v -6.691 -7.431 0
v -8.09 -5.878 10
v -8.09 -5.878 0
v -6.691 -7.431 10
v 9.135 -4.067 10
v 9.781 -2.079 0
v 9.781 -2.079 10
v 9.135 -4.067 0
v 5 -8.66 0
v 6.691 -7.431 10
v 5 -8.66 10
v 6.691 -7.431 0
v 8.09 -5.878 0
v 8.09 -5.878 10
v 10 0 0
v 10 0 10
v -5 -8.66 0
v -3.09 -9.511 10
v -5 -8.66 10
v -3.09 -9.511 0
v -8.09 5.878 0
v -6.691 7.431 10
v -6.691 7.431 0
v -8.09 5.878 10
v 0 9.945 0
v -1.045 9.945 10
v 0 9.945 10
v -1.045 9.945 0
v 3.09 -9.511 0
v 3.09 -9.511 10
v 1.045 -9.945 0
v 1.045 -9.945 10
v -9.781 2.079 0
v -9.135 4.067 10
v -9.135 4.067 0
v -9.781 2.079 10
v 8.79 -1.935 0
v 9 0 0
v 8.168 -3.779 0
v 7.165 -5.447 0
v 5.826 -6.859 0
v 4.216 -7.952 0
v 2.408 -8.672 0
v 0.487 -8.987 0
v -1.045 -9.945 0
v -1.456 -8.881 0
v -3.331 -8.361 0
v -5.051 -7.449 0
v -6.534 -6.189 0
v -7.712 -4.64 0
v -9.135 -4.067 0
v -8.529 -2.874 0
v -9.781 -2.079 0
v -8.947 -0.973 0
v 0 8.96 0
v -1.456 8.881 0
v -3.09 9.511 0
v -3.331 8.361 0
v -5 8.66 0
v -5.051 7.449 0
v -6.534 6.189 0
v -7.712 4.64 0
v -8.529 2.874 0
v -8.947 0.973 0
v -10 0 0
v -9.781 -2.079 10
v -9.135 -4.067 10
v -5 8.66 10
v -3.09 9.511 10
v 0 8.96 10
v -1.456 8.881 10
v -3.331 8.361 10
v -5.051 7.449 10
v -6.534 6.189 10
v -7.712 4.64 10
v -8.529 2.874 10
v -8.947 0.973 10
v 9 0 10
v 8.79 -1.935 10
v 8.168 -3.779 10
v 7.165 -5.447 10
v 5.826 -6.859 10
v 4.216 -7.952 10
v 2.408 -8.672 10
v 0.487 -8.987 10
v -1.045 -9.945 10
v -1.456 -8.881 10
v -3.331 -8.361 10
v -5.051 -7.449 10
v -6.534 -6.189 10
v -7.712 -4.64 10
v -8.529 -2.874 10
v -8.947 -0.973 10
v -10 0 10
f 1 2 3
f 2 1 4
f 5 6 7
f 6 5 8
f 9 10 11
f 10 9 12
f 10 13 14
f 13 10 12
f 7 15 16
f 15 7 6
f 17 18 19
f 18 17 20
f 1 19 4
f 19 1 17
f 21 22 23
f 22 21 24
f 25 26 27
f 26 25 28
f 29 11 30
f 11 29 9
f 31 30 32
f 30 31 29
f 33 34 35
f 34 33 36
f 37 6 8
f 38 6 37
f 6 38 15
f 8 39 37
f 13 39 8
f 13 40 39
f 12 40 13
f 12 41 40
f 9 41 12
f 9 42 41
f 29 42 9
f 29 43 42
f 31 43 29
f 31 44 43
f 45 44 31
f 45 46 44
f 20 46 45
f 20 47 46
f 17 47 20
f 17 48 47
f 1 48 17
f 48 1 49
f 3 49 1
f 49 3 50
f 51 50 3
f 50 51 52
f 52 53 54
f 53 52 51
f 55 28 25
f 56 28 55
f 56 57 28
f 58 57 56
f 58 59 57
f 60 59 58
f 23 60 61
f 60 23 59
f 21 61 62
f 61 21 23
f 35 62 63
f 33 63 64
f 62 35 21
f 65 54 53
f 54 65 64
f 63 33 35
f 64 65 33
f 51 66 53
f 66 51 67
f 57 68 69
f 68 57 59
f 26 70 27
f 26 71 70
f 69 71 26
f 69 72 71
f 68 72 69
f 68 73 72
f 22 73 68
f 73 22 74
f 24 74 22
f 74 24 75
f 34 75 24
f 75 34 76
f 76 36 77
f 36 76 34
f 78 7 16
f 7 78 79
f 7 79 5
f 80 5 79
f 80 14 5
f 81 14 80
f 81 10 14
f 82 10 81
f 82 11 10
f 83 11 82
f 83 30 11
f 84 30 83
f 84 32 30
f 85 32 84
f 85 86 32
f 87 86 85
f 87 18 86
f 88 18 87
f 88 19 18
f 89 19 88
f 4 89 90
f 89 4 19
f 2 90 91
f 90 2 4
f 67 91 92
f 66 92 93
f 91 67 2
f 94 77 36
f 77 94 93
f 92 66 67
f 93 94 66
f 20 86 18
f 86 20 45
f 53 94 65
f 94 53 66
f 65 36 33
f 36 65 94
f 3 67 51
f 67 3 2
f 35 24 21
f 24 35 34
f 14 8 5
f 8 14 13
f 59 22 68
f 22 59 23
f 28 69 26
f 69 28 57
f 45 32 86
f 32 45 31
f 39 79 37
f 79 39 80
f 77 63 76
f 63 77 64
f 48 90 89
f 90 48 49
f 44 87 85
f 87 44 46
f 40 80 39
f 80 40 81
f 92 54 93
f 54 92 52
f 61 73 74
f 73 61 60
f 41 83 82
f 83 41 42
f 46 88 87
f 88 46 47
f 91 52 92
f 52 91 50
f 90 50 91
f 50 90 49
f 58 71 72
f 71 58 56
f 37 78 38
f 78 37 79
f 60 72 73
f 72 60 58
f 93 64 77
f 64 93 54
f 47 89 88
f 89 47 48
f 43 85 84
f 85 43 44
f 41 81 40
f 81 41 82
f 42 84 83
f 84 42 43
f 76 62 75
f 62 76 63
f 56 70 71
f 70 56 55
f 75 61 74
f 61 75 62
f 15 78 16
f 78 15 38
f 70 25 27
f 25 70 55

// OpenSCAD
module enganche_pequenyo(radio, alto, anchoPared) {

    margen = 1;

    difference() {
        cylinder(r=radio, h=alto);
        translate([0,0,-margen])
            cylinder(r=radio-anchoPared, h=(alto+2*margen));
        translate([0,0,-margen])        
            cunya(angulo=90,largo=2*radio+margen,alto=alto+2*margen);  
    }
    
}

module cunya(angulo, largo, alto) {
    
point0 = [0,0];
point1 = [0,largo];
point2 = [largo*sin(angulo), largo*cos(angulo)];
    
points = [point0,point1,point2];
    linear_extrude(height=alto) {
        polygon(points = points);    
    }
}



enganche_pequenyo(10,10,1);
